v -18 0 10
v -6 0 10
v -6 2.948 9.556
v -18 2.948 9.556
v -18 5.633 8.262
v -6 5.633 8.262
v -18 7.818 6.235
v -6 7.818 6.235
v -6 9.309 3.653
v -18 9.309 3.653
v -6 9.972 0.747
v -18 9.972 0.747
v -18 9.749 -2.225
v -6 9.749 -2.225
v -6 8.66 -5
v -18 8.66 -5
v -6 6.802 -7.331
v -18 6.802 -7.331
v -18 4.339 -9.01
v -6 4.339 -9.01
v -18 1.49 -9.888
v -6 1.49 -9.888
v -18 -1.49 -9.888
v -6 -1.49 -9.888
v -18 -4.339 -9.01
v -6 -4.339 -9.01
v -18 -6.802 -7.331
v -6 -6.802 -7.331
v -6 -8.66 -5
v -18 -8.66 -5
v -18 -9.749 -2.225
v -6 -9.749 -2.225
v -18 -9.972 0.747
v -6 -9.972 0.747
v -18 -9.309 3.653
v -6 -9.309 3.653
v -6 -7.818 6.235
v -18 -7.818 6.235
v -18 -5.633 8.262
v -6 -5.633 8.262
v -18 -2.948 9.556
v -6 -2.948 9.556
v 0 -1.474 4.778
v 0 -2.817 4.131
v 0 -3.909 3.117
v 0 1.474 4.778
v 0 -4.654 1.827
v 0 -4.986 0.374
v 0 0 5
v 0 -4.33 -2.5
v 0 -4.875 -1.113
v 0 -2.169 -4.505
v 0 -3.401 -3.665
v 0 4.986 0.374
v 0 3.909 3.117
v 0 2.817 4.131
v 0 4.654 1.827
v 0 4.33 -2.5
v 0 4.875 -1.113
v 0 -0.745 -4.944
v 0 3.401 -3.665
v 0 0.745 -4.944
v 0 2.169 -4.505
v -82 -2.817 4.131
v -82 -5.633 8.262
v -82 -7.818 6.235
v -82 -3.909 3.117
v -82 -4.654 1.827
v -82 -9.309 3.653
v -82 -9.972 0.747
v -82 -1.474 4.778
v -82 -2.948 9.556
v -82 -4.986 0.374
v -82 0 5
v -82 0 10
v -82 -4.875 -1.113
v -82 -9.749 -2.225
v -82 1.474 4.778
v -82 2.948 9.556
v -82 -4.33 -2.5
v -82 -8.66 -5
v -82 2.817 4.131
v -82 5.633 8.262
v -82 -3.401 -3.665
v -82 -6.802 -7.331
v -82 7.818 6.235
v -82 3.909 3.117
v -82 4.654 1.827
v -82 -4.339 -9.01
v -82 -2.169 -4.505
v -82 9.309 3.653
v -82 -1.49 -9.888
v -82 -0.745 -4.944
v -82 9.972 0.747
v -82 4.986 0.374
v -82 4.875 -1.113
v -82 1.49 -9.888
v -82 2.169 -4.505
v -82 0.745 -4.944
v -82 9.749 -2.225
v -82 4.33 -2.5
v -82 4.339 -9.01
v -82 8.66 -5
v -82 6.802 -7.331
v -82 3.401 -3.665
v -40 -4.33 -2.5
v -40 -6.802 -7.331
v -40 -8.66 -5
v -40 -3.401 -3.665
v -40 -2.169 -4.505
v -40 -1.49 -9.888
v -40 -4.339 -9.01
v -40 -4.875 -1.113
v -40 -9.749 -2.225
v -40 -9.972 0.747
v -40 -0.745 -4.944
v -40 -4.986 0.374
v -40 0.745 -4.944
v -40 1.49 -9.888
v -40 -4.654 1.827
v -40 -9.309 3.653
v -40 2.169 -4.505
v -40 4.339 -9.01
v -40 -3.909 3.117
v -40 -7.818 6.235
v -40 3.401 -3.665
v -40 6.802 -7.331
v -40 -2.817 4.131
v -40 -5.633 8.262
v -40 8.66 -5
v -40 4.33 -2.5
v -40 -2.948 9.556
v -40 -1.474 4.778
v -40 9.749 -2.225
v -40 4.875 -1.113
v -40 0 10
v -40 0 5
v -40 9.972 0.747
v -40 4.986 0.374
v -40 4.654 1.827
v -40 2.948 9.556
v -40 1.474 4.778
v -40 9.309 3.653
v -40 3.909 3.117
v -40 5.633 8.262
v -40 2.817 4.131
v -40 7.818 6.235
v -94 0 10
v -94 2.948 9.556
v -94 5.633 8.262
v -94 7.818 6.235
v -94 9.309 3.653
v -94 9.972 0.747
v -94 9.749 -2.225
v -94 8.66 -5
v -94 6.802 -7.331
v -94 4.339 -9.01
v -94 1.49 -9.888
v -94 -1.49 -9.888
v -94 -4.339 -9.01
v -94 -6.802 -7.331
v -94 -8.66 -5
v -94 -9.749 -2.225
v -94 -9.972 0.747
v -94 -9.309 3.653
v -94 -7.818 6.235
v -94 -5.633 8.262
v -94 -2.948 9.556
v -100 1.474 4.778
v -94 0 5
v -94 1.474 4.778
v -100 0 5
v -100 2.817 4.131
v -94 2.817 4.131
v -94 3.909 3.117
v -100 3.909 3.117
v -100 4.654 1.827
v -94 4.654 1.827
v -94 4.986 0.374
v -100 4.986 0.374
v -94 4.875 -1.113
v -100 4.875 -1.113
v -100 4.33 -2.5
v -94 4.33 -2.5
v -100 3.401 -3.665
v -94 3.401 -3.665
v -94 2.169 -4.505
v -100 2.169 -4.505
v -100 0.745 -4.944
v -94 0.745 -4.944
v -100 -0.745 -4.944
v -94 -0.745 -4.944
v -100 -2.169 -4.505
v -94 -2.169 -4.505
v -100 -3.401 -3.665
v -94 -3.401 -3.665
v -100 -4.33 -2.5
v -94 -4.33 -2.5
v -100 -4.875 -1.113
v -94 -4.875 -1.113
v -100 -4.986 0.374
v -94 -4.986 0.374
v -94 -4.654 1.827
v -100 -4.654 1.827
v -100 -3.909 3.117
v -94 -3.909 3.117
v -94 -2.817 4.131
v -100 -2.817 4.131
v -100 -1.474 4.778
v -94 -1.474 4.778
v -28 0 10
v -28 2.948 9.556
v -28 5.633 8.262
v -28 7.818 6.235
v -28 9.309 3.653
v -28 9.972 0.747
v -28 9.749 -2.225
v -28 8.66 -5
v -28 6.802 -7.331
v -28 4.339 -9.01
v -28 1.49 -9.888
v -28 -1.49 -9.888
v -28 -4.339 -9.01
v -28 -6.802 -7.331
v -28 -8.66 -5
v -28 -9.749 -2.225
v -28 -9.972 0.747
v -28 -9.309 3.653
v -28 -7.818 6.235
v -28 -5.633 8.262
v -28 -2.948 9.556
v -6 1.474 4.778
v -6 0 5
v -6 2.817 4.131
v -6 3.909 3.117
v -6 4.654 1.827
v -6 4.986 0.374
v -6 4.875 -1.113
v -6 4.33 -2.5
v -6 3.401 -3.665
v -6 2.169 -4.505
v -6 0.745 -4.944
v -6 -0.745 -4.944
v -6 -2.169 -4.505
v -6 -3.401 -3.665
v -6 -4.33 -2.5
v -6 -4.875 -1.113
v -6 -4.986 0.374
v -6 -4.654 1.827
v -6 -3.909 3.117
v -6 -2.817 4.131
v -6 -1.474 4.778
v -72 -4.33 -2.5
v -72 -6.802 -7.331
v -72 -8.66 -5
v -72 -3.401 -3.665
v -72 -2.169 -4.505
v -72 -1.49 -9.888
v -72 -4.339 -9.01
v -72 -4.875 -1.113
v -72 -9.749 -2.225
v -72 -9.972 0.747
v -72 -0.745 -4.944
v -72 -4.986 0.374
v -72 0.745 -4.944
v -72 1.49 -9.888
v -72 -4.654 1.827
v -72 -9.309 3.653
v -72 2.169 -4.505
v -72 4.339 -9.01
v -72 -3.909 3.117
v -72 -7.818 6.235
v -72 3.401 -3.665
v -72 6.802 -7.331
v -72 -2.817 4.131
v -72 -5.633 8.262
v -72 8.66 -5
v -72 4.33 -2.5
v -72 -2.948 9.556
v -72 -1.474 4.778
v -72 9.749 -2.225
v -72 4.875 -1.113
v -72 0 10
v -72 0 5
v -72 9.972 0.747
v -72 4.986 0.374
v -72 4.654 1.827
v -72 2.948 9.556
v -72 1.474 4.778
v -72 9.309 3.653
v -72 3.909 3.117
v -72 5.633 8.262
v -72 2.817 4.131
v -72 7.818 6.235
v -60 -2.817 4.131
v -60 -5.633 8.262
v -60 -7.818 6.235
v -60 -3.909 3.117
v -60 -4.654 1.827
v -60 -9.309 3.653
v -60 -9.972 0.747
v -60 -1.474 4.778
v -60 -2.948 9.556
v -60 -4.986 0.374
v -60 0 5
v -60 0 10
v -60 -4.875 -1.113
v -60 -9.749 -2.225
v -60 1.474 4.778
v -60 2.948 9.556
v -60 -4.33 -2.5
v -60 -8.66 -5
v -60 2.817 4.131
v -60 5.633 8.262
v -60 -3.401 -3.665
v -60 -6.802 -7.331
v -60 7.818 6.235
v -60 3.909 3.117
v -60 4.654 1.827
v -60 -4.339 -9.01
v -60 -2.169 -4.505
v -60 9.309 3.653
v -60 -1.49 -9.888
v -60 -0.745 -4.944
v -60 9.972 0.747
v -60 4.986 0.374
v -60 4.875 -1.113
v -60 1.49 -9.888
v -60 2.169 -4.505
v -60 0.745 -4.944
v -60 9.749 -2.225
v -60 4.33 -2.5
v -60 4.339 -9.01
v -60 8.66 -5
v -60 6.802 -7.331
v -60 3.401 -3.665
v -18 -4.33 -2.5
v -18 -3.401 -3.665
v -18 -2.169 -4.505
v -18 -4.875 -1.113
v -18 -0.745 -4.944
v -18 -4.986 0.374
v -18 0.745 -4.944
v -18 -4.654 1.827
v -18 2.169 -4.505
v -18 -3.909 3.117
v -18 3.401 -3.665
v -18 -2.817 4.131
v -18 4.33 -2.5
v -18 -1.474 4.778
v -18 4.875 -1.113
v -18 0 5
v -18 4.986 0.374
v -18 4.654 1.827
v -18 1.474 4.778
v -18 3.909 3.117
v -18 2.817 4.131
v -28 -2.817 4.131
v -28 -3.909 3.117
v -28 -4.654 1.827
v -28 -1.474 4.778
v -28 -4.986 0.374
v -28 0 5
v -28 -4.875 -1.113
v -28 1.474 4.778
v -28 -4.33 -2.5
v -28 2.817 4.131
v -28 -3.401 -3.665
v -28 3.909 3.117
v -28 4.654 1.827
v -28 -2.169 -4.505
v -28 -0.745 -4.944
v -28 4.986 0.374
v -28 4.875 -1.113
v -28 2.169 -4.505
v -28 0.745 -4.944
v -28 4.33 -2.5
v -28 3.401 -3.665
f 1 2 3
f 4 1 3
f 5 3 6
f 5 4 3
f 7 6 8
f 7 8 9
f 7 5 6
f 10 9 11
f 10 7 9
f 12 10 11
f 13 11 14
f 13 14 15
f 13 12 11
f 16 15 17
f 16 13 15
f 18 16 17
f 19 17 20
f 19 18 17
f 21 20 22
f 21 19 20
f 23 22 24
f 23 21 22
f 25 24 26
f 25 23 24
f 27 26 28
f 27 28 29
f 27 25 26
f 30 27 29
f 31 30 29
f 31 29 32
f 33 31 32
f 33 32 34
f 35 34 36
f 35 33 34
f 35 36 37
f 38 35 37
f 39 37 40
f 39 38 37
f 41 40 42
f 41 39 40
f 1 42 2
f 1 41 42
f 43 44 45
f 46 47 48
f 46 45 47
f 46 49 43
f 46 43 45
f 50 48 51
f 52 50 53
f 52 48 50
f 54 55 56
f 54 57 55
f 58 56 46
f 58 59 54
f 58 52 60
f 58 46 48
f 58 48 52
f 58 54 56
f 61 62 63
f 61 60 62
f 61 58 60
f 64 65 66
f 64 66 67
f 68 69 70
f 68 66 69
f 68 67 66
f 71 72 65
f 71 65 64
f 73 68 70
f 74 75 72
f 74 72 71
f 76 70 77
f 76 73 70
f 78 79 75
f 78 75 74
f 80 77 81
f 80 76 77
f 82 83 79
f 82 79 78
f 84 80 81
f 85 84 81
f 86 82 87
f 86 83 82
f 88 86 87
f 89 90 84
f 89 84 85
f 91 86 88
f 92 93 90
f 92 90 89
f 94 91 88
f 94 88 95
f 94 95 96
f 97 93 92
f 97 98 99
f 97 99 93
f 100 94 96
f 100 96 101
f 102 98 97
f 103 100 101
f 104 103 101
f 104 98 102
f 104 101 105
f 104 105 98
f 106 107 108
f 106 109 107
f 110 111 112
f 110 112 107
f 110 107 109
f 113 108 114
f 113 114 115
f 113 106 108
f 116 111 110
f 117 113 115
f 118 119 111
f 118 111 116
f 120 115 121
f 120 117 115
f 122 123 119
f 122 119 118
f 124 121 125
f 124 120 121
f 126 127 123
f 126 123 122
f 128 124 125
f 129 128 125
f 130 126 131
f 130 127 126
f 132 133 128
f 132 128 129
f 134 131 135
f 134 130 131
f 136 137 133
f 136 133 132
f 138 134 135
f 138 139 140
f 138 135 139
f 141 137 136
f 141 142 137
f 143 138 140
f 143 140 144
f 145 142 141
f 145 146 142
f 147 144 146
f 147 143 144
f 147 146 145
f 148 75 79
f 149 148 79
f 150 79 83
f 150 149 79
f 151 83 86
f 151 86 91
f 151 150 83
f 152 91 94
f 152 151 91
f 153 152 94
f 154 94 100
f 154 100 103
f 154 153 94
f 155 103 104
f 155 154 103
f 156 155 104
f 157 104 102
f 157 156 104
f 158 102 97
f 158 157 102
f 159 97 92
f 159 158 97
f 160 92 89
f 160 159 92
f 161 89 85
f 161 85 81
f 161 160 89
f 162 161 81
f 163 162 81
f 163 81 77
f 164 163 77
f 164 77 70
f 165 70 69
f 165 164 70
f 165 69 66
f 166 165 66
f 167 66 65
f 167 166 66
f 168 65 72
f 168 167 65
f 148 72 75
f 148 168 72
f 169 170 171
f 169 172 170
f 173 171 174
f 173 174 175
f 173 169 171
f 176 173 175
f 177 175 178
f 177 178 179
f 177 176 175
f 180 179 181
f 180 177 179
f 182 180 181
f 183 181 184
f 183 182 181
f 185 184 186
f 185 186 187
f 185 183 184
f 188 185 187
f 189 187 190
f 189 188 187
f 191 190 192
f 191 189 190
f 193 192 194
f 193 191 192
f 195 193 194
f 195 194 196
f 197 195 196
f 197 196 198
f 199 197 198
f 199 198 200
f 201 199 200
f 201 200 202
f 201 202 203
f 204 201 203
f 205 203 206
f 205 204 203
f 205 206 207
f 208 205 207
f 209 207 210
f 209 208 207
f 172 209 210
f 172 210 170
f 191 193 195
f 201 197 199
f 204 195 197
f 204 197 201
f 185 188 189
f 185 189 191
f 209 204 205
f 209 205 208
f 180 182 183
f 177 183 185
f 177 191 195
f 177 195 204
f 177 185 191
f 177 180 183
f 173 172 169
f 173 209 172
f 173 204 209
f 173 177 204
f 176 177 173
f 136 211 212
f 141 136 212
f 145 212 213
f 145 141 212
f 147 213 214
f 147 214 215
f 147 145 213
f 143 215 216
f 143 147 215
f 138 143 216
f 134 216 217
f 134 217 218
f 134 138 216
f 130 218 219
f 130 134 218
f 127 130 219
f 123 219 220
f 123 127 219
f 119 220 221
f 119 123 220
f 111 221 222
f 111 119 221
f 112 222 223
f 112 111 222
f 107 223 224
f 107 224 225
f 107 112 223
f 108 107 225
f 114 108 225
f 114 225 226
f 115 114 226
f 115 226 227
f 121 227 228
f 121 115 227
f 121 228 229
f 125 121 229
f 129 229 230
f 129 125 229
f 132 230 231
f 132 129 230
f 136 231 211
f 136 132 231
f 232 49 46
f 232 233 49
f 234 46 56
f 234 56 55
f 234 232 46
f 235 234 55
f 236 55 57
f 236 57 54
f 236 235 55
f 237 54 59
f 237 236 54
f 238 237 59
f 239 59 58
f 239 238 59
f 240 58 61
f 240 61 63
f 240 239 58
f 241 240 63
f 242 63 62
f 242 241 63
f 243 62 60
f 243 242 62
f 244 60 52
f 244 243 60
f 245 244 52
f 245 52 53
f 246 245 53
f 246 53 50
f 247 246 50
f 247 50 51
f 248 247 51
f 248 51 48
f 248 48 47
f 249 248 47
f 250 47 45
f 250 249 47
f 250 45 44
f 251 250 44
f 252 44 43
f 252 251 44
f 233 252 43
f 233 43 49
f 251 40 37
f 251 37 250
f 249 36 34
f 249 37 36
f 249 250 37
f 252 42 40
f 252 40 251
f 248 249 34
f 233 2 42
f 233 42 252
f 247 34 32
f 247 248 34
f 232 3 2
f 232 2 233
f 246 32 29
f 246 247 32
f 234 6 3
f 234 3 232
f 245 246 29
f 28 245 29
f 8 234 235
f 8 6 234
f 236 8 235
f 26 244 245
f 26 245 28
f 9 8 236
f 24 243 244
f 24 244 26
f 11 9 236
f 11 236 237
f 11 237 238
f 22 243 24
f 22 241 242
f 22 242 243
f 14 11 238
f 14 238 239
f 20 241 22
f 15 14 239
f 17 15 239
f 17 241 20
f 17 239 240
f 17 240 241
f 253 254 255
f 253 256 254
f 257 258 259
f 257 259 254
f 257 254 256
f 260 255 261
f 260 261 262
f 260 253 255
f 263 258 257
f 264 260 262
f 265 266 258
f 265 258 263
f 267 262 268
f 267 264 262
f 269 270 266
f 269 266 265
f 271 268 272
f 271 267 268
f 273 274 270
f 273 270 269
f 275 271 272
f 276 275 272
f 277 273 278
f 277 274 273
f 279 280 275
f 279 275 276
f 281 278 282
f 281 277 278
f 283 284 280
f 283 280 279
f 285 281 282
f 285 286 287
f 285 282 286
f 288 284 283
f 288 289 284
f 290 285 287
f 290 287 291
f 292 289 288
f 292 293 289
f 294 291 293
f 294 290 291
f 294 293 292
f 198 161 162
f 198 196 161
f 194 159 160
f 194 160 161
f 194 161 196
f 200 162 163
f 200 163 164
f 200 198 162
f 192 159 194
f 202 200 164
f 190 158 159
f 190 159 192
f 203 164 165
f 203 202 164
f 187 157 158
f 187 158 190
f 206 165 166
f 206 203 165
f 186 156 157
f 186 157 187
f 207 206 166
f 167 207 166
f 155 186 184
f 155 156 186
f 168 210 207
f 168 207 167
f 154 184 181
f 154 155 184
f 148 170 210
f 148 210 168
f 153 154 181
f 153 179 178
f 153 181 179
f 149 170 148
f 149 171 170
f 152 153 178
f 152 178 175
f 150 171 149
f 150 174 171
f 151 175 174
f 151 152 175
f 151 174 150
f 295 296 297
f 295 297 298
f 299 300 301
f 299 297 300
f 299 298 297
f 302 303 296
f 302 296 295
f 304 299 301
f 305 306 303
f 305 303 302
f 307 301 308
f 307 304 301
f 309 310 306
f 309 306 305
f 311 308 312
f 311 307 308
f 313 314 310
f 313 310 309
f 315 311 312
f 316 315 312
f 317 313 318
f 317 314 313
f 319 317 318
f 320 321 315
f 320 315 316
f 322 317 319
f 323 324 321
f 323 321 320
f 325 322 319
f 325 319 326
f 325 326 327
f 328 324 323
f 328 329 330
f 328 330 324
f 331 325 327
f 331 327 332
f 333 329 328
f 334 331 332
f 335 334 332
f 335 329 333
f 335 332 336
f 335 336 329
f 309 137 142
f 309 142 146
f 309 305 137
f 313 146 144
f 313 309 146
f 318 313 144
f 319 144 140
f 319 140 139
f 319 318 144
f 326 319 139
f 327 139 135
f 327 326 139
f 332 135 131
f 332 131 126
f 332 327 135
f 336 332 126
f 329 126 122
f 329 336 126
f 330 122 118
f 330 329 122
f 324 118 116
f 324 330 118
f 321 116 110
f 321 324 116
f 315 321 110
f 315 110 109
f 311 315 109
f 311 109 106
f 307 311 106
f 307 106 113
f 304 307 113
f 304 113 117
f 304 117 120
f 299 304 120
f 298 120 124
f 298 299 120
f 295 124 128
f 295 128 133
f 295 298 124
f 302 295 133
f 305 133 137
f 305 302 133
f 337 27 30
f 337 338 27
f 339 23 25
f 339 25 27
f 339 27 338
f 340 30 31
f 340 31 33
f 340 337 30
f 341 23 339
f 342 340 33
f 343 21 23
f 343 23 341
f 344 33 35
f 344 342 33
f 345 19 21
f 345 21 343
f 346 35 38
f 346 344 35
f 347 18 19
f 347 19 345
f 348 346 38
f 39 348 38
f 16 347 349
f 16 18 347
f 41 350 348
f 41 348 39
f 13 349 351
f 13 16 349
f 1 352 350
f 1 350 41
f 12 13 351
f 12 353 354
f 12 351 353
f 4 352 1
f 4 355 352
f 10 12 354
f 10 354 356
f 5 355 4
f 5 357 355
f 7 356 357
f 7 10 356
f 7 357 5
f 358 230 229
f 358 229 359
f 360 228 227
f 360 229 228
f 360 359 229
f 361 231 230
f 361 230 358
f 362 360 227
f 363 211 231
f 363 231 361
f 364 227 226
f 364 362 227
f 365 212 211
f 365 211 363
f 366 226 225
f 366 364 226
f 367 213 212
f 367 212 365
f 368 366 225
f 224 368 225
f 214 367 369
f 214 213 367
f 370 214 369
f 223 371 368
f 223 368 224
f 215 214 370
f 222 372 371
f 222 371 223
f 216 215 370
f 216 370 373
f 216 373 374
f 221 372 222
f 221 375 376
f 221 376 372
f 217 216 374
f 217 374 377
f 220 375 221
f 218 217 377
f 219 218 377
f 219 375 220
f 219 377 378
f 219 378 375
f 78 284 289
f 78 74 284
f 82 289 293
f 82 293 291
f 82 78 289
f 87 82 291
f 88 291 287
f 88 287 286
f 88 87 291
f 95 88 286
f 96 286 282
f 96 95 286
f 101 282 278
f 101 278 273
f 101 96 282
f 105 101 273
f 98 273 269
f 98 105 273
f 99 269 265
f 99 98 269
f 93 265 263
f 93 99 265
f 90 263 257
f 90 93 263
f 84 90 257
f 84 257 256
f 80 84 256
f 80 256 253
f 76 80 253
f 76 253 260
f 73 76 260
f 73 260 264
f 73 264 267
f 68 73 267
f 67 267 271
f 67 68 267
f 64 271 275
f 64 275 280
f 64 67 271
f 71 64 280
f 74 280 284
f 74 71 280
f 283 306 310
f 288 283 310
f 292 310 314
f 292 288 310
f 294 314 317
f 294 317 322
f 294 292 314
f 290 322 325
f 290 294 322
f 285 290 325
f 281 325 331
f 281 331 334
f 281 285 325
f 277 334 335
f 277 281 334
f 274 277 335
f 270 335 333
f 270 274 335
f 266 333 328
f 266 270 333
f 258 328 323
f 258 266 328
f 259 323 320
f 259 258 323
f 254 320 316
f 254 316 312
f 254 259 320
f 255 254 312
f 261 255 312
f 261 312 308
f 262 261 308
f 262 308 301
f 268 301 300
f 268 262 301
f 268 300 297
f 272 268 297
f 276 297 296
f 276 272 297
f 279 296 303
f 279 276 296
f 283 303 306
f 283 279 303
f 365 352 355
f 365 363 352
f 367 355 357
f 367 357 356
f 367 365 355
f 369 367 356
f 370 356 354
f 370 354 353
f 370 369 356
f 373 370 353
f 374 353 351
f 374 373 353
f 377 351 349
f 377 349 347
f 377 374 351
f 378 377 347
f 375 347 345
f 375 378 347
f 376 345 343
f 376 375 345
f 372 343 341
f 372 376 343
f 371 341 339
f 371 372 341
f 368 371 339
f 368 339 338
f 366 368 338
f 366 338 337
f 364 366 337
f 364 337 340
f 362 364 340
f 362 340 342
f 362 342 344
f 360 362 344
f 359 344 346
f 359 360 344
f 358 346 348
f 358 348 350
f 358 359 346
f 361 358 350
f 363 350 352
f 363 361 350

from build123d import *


with BuildPart() as f1:
    # F0 (on Front) → F1 (revolve)
    with BuildSketch(Plane.XZ):
        Polygon((-100, 0), (0, 0), (0, 5), (-6, 5), (-6, 10), (-18, 10), (-18, 5), (-28, 5), (-28, 10), (-40, 10), (-40, 5), (-60, 5), (-60, 10), (-72, 10), (-72, 5), (-82, 5), (-82, 10), (-94, 10), (-94, 5), (-100, 5), align=None)
    revolve(axis=Axis((-44.310086, 0, 0), (-1, 0, 0)))


solid = f1.part
